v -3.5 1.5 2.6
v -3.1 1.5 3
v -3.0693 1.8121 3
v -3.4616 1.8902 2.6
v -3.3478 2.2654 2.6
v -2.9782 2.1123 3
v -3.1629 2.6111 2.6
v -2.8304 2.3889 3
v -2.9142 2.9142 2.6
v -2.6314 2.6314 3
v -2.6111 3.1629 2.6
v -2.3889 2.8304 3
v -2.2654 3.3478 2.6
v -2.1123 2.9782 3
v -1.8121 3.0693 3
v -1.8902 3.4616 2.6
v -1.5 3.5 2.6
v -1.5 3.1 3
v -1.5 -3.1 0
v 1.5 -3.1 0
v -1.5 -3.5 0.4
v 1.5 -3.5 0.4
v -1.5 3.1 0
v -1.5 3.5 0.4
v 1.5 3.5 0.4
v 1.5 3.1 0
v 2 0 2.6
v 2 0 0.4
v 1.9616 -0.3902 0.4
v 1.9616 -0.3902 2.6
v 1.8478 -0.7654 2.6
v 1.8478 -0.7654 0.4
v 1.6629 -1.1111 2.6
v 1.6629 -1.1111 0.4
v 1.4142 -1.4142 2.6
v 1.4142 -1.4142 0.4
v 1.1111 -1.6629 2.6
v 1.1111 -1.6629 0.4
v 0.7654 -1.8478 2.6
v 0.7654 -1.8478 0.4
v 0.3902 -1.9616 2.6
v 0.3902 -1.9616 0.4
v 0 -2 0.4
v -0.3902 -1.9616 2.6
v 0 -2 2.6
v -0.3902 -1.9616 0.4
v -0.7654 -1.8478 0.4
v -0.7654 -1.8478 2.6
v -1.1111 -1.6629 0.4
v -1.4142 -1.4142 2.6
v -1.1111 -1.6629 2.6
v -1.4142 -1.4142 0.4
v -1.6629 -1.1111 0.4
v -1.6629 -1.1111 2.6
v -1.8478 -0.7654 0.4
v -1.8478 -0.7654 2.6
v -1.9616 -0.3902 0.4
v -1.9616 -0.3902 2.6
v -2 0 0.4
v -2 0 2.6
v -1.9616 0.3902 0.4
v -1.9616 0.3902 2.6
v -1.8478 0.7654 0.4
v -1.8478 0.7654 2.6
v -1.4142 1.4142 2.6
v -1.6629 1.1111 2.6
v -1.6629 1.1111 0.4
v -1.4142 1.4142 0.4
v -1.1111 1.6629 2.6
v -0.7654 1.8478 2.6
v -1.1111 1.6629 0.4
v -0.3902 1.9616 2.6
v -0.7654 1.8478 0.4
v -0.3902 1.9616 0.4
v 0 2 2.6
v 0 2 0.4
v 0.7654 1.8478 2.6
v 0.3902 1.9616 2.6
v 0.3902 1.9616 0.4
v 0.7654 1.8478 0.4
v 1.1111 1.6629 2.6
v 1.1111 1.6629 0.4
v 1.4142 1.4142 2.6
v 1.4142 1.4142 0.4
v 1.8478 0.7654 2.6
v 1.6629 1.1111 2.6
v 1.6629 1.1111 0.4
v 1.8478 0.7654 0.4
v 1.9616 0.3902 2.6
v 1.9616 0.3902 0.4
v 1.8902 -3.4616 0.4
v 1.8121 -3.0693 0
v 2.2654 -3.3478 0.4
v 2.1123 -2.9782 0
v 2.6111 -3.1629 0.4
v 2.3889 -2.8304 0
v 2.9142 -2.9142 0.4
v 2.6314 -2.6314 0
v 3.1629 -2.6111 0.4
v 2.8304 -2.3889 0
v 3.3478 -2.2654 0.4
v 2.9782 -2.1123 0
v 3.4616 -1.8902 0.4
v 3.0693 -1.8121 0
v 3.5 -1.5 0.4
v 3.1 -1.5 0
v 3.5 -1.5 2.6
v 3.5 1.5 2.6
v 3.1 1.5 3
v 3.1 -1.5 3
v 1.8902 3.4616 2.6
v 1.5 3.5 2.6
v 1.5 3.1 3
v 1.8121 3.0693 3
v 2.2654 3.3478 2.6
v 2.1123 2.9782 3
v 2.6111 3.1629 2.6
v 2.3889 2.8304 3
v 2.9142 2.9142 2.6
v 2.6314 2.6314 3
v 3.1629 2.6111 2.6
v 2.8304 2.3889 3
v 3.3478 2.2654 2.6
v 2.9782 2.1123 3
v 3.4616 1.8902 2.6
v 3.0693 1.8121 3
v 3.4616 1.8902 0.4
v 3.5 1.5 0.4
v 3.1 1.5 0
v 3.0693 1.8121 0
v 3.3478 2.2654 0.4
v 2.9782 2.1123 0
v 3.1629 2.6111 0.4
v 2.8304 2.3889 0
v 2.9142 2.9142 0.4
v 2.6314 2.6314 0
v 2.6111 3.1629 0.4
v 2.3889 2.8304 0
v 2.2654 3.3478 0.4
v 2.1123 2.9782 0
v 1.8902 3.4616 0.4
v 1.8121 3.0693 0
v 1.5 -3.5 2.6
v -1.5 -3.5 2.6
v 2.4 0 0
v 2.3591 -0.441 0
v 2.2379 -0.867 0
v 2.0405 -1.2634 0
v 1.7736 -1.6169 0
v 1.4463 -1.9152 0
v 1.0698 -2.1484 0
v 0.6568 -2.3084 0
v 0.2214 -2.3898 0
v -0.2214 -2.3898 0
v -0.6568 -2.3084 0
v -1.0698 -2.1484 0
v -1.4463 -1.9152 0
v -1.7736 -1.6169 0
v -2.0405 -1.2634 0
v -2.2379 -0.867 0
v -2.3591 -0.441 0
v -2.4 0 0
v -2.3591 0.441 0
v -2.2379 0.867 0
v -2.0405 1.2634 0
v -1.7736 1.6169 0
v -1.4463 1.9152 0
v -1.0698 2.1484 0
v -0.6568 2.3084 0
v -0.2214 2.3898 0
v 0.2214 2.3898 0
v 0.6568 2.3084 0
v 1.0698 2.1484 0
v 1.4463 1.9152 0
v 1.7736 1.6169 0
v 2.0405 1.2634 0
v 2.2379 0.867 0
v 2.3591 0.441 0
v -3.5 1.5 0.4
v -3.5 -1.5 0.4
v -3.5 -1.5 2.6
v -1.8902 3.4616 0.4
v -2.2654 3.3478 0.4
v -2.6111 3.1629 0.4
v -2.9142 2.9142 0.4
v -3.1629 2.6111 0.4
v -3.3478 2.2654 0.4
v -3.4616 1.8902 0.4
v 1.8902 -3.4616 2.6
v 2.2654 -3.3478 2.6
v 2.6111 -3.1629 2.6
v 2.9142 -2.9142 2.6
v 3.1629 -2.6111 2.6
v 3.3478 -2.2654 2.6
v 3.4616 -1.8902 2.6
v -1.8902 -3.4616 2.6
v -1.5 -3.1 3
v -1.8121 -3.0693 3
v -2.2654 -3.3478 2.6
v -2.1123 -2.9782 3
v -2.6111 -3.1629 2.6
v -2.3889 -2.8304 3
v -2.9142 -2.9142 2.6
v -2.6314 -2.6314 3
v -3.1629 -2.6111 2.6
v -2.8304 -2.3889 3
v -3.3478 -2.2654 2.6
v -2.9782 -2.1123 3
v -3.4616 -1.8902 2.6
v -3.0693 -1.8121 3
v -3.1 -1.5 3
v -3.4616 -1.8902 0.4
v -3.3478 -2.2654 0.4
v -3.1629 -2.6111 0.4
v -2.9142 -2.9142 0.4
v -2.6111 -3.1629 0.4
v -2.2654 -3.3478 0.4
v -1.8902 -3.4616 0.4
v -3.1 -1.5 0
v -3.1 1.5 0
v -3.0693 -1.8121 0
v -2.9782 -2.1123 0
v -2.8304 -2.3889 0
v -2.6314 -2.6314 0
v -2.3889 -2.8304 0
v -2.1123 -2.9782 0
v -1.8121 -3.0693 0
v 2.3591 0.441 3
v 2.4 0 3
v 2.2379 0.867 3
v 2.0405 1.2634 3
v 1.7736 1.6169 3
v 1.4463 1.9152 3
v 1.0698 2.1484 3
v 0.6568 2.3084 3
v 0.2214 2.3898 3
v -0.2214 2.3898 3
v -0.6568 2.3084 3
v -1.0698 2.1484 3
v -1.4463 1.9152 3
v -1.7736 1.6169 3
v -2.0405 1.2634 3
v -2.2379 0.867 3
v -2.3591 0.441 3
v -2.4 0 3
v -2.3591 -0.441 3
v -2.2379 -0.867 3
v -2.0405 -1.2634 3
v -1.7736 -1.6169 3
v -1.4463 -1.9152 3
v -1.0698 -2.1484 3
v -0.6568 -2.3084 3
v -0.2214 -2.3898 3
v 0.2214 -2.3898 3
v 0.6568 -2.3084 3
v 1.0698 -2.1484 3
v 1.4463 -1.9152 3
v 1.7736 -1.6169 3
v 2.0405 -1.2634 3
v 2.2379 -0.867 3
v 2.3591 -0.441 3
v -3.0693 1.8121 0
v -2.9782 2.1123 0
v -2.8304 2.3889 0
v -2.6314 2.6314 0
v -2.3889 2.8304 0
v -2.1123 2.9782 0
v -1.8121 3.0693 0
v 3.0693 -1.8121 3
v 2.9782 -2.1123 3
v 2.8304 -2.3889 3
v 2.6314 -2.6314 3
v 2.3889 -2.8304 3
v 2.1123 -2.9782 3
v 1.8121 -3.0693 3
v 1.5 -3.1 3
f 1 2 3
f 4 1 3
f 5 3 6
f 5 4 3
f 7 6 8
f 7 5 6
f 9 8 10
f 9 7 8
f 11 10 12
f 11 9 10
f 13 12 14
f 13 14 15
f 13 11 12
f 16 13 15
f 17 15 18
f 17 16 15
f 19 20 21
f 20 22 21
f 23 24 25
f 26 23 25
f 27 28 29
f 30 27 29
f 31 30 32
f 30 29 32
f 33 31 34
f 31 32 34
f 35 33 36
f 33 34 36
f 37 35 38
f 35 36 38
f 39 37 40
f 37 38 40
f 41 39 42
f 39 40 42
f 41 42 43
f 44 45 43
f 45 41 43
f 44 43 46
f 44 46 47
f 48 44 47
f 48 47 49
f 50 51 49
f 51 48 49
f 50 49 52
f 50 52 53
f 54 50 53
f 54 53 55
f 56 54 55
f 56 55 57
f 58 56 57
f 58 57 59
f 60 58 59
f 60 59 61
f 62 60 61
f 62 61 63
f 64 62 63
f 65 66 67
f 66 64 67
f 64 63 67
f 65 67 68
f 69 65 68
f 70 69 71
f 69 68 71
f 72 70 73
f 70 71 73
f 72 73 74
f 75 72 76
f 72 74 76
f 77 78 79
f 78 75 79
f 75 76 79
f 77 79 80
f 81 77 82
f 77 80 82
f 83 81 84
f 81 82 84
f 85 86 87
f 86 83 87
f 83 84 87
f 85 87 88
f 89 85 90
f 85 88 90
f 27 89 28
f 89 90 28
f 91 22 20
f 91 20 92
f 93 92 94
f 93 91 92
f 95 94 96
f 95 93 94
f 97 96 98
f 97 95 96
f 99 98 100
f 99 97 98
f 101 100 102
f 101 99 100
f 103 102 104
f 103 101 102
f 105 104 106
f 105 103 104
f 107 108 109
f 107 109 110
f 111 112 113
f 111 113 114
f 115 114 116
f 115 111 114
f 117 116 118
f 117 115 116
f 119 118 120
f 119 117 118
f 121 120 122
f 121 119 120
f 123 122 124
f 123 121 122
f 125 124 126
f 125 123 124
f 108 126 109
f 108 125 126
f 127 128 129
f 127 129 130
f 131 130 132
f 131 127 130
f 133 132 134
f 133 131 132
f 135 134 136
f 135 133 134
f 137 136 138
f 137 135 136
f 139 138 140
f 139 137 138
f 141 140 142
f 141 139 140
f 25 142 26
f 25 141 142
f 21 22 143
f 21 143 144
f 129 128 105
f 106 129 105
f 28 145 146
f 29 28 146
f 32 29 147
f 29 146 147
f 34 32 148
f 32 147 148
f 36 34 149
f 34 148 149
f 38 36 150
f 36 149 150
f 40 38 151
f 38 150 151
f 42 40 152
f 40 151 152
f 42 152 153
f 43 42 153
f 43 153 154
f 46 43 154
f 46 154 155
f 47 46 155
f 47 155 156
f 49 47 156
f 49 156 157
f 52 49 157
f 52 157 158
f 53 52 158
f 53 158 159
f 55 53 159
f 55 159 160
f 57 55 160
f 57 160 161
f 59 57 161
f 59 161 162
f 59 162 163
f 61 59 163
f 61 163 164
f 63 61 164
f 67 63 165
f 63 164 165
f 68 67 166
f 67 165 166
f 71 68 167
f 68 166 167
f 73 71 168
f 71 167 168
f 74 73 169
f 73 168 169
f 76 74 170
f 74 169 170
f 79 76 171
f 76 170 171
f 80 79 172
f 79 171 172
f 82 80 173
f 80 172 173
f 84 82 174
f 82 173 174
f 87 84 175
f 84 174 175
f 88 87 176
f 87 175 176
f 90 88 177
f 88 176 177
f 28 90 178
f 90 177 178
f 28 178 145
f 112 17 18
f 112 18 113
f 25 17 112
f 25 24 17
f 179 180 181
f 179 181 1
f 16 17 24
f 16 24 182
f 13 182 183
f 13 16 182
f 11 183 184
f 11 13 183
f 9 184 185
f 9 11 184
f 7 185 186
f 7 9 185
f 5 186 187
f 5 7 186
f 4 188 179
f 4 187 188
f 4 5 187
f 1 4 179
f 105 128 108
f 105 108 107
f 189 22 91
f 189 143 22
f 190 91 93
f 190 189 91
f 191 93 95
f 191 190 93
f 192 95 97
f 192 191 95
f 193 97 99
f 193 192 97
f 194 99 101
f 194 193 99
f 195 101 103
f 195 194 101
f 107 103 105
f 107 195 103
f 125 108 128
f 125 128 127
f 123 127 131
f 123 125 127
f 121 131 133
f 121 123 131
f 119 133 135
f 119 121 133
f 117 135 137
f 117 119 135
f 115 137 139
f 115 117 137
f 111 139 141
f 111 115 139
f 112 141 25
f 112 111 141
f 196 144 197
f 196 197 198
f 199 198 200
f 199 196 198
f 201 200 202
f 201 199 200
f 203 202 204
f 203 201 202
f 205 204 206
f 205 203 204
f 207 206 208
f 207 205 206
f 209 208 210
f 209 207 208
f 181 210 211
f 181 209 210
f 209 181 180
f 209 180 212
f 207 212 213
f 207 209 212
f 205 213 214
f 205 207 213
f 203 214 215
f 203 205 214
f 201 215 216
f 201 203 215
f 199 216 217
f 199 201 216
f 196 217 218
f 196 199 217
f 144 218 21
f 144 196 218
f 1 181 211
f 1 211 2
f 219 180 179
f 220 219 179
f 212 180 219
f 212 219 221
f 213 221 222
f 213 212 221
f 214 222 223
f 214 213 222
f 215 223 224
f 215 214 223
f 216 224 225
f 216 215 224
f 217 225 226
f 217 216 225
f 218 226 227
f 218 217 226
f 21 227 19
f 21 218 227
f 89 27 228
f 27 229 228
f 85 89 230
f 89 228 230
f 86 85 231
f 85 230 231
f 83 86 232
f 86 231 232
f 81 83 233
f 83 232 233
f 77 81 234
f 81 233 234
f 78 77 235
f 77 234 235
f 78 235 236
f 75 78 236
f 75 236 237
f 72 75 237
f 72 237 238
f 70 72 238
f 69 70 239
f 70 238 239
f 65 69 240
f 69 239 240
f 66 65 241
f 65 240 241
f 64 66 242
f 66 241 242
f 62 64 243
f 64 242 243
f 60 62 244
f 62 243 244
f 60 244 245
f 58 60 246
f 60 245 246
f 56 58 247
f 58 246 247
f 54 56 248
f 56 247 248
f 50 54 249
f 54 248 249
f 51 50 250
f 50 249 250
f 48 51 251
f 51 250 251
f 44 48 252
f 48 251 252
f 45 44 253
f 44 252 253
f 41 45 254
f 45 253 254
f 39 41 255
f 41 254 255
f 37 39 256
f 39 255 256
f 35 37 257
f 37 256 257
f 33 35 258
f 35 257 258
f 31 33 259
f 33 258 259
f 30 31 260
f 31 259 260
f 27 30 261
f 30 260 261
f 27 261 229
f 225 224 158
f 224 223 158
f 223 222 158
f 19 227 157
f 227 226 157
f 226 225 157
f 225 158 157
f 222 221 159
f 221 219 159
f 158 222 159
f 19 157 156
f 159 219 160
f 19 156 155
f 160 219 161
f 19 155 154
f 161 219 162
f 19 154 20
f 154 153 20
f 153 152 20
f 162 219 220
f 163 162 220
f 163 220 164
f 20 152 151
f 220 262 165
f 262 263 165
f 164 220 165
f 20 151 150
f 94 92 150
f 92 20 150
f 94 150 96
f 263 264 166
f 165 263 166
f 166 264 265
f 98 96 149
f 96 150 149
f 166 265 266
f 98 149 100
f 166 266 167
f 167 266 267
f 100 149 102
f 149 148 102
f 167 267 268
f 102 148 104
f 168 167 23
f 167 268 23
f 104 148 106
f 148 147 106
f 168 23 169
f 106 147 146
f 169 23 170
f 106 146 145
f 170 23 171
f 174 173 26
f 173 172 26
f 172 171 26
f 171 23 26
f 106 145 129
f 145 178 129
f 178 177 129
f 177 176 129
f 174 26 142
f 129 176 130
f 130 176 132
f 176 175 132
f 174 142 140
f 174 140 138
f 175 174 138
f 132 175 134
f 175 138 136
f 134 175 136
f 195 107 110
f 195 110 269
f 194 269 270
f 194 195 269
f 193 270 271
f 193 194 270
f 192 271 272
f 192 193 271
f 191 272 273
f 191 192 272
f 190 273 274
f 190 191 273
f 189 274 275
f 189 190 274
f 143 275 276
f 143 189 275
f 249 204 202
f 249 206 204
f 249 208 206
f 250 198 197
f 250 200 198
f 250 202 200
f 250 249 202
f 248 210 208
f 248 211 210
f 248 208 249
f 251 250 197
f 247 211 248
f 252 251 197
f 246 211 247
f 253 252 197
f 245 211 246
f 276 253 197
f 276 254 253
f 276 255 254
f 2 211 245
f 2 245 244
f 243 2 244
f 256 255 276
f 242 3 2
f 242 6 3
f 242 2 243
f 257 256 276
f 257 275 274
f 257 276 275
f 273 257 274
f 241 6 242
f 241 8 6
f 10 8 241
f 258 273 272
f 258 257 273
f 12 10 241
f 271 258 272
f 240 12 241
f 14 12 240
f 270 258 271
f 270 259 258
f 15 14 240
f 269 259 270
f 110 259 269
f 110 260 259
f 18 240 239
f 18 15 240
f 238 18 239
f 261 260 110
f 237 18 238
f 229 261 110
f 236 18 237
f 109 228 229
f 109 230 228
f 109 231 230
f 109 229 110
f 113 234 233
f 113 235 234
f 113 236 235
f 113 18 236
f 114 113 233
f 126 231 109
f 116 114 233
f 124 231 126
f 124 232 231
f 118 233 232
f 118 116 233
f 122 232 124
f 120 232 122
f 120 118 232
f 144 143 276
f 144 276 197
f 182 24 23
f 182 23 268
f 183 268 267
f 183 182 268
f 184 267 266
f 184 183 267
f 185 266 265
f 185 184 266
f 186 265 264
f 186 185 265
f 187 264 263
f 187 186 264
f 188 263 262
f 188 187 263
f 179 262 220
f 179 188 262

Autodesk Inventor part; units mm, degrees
ref_plane "YZ Plane" through (0, 0, 0) normal (1, 0, 0) x (0, 1, 0)
ref_plane "XZ Plane" through (0, 0, 0) normal (0, 1, 0) x (-1, 0, 0)
ref_plane "XY Plane" through (0, 0, 0) normal (0, 0, 1) x (1, 0, 0)
sketch "Sketch1" plane through (0, 0, 0) normal (0, 0, 1) x (1, 0, 0)
  circle A0 centre (0, 0) radius 2
  line L0 (-3.5, 3.5) -> (3.5, 3.5)
  line L1 (3.5, 3.5) -> (3.5, -3.5)
  line L2 (3.5, -3.5) -> (-3.5, -3.5)
  line L3 (-3.5, -3.5) -> (-3.5, 3.5)
  point P0 (3.5, 0)
  point P1 (0, 3.5)
  dimension "d0" = 4
  dimension "d24" = 7
extrude "Extrusion1" add sketch "Sketch1" along normal blind 3
fillet "Fillet3" radius 2 4 edges at (3.5, 3.5, 1.5) (3.5, -3.5, 1.5) (-3.5, -3.5, 1.5) (-3.5, 3.5, 1.5)
chamfer "Chamfer4" distance 0.4 angle 45 18 edges at (-2.9142, -2.9142, 3) (-3.5, 0, 3) (-2.9142, 2.9142, 3) (0, 3.5, 3) (2.9142, 2.9142, 3) (3.5, 0, 3) (2.9142, -2.9142, 3) (0, -3.5, 3) (2.9142, -2.9142, 0) (3.5, 0, 0) (2.9142, 2.9142, 0) (0, 3.5, 0) (-2.9142, 2.9142, 0) (-3.5, 0, 0) (-2.9142, -2.9142, 0) (0, -3.5, 0) (-2, 0, 3) (-2, 0, 0)
properties part number "shaft-10mm" material "ABS Plastic"
